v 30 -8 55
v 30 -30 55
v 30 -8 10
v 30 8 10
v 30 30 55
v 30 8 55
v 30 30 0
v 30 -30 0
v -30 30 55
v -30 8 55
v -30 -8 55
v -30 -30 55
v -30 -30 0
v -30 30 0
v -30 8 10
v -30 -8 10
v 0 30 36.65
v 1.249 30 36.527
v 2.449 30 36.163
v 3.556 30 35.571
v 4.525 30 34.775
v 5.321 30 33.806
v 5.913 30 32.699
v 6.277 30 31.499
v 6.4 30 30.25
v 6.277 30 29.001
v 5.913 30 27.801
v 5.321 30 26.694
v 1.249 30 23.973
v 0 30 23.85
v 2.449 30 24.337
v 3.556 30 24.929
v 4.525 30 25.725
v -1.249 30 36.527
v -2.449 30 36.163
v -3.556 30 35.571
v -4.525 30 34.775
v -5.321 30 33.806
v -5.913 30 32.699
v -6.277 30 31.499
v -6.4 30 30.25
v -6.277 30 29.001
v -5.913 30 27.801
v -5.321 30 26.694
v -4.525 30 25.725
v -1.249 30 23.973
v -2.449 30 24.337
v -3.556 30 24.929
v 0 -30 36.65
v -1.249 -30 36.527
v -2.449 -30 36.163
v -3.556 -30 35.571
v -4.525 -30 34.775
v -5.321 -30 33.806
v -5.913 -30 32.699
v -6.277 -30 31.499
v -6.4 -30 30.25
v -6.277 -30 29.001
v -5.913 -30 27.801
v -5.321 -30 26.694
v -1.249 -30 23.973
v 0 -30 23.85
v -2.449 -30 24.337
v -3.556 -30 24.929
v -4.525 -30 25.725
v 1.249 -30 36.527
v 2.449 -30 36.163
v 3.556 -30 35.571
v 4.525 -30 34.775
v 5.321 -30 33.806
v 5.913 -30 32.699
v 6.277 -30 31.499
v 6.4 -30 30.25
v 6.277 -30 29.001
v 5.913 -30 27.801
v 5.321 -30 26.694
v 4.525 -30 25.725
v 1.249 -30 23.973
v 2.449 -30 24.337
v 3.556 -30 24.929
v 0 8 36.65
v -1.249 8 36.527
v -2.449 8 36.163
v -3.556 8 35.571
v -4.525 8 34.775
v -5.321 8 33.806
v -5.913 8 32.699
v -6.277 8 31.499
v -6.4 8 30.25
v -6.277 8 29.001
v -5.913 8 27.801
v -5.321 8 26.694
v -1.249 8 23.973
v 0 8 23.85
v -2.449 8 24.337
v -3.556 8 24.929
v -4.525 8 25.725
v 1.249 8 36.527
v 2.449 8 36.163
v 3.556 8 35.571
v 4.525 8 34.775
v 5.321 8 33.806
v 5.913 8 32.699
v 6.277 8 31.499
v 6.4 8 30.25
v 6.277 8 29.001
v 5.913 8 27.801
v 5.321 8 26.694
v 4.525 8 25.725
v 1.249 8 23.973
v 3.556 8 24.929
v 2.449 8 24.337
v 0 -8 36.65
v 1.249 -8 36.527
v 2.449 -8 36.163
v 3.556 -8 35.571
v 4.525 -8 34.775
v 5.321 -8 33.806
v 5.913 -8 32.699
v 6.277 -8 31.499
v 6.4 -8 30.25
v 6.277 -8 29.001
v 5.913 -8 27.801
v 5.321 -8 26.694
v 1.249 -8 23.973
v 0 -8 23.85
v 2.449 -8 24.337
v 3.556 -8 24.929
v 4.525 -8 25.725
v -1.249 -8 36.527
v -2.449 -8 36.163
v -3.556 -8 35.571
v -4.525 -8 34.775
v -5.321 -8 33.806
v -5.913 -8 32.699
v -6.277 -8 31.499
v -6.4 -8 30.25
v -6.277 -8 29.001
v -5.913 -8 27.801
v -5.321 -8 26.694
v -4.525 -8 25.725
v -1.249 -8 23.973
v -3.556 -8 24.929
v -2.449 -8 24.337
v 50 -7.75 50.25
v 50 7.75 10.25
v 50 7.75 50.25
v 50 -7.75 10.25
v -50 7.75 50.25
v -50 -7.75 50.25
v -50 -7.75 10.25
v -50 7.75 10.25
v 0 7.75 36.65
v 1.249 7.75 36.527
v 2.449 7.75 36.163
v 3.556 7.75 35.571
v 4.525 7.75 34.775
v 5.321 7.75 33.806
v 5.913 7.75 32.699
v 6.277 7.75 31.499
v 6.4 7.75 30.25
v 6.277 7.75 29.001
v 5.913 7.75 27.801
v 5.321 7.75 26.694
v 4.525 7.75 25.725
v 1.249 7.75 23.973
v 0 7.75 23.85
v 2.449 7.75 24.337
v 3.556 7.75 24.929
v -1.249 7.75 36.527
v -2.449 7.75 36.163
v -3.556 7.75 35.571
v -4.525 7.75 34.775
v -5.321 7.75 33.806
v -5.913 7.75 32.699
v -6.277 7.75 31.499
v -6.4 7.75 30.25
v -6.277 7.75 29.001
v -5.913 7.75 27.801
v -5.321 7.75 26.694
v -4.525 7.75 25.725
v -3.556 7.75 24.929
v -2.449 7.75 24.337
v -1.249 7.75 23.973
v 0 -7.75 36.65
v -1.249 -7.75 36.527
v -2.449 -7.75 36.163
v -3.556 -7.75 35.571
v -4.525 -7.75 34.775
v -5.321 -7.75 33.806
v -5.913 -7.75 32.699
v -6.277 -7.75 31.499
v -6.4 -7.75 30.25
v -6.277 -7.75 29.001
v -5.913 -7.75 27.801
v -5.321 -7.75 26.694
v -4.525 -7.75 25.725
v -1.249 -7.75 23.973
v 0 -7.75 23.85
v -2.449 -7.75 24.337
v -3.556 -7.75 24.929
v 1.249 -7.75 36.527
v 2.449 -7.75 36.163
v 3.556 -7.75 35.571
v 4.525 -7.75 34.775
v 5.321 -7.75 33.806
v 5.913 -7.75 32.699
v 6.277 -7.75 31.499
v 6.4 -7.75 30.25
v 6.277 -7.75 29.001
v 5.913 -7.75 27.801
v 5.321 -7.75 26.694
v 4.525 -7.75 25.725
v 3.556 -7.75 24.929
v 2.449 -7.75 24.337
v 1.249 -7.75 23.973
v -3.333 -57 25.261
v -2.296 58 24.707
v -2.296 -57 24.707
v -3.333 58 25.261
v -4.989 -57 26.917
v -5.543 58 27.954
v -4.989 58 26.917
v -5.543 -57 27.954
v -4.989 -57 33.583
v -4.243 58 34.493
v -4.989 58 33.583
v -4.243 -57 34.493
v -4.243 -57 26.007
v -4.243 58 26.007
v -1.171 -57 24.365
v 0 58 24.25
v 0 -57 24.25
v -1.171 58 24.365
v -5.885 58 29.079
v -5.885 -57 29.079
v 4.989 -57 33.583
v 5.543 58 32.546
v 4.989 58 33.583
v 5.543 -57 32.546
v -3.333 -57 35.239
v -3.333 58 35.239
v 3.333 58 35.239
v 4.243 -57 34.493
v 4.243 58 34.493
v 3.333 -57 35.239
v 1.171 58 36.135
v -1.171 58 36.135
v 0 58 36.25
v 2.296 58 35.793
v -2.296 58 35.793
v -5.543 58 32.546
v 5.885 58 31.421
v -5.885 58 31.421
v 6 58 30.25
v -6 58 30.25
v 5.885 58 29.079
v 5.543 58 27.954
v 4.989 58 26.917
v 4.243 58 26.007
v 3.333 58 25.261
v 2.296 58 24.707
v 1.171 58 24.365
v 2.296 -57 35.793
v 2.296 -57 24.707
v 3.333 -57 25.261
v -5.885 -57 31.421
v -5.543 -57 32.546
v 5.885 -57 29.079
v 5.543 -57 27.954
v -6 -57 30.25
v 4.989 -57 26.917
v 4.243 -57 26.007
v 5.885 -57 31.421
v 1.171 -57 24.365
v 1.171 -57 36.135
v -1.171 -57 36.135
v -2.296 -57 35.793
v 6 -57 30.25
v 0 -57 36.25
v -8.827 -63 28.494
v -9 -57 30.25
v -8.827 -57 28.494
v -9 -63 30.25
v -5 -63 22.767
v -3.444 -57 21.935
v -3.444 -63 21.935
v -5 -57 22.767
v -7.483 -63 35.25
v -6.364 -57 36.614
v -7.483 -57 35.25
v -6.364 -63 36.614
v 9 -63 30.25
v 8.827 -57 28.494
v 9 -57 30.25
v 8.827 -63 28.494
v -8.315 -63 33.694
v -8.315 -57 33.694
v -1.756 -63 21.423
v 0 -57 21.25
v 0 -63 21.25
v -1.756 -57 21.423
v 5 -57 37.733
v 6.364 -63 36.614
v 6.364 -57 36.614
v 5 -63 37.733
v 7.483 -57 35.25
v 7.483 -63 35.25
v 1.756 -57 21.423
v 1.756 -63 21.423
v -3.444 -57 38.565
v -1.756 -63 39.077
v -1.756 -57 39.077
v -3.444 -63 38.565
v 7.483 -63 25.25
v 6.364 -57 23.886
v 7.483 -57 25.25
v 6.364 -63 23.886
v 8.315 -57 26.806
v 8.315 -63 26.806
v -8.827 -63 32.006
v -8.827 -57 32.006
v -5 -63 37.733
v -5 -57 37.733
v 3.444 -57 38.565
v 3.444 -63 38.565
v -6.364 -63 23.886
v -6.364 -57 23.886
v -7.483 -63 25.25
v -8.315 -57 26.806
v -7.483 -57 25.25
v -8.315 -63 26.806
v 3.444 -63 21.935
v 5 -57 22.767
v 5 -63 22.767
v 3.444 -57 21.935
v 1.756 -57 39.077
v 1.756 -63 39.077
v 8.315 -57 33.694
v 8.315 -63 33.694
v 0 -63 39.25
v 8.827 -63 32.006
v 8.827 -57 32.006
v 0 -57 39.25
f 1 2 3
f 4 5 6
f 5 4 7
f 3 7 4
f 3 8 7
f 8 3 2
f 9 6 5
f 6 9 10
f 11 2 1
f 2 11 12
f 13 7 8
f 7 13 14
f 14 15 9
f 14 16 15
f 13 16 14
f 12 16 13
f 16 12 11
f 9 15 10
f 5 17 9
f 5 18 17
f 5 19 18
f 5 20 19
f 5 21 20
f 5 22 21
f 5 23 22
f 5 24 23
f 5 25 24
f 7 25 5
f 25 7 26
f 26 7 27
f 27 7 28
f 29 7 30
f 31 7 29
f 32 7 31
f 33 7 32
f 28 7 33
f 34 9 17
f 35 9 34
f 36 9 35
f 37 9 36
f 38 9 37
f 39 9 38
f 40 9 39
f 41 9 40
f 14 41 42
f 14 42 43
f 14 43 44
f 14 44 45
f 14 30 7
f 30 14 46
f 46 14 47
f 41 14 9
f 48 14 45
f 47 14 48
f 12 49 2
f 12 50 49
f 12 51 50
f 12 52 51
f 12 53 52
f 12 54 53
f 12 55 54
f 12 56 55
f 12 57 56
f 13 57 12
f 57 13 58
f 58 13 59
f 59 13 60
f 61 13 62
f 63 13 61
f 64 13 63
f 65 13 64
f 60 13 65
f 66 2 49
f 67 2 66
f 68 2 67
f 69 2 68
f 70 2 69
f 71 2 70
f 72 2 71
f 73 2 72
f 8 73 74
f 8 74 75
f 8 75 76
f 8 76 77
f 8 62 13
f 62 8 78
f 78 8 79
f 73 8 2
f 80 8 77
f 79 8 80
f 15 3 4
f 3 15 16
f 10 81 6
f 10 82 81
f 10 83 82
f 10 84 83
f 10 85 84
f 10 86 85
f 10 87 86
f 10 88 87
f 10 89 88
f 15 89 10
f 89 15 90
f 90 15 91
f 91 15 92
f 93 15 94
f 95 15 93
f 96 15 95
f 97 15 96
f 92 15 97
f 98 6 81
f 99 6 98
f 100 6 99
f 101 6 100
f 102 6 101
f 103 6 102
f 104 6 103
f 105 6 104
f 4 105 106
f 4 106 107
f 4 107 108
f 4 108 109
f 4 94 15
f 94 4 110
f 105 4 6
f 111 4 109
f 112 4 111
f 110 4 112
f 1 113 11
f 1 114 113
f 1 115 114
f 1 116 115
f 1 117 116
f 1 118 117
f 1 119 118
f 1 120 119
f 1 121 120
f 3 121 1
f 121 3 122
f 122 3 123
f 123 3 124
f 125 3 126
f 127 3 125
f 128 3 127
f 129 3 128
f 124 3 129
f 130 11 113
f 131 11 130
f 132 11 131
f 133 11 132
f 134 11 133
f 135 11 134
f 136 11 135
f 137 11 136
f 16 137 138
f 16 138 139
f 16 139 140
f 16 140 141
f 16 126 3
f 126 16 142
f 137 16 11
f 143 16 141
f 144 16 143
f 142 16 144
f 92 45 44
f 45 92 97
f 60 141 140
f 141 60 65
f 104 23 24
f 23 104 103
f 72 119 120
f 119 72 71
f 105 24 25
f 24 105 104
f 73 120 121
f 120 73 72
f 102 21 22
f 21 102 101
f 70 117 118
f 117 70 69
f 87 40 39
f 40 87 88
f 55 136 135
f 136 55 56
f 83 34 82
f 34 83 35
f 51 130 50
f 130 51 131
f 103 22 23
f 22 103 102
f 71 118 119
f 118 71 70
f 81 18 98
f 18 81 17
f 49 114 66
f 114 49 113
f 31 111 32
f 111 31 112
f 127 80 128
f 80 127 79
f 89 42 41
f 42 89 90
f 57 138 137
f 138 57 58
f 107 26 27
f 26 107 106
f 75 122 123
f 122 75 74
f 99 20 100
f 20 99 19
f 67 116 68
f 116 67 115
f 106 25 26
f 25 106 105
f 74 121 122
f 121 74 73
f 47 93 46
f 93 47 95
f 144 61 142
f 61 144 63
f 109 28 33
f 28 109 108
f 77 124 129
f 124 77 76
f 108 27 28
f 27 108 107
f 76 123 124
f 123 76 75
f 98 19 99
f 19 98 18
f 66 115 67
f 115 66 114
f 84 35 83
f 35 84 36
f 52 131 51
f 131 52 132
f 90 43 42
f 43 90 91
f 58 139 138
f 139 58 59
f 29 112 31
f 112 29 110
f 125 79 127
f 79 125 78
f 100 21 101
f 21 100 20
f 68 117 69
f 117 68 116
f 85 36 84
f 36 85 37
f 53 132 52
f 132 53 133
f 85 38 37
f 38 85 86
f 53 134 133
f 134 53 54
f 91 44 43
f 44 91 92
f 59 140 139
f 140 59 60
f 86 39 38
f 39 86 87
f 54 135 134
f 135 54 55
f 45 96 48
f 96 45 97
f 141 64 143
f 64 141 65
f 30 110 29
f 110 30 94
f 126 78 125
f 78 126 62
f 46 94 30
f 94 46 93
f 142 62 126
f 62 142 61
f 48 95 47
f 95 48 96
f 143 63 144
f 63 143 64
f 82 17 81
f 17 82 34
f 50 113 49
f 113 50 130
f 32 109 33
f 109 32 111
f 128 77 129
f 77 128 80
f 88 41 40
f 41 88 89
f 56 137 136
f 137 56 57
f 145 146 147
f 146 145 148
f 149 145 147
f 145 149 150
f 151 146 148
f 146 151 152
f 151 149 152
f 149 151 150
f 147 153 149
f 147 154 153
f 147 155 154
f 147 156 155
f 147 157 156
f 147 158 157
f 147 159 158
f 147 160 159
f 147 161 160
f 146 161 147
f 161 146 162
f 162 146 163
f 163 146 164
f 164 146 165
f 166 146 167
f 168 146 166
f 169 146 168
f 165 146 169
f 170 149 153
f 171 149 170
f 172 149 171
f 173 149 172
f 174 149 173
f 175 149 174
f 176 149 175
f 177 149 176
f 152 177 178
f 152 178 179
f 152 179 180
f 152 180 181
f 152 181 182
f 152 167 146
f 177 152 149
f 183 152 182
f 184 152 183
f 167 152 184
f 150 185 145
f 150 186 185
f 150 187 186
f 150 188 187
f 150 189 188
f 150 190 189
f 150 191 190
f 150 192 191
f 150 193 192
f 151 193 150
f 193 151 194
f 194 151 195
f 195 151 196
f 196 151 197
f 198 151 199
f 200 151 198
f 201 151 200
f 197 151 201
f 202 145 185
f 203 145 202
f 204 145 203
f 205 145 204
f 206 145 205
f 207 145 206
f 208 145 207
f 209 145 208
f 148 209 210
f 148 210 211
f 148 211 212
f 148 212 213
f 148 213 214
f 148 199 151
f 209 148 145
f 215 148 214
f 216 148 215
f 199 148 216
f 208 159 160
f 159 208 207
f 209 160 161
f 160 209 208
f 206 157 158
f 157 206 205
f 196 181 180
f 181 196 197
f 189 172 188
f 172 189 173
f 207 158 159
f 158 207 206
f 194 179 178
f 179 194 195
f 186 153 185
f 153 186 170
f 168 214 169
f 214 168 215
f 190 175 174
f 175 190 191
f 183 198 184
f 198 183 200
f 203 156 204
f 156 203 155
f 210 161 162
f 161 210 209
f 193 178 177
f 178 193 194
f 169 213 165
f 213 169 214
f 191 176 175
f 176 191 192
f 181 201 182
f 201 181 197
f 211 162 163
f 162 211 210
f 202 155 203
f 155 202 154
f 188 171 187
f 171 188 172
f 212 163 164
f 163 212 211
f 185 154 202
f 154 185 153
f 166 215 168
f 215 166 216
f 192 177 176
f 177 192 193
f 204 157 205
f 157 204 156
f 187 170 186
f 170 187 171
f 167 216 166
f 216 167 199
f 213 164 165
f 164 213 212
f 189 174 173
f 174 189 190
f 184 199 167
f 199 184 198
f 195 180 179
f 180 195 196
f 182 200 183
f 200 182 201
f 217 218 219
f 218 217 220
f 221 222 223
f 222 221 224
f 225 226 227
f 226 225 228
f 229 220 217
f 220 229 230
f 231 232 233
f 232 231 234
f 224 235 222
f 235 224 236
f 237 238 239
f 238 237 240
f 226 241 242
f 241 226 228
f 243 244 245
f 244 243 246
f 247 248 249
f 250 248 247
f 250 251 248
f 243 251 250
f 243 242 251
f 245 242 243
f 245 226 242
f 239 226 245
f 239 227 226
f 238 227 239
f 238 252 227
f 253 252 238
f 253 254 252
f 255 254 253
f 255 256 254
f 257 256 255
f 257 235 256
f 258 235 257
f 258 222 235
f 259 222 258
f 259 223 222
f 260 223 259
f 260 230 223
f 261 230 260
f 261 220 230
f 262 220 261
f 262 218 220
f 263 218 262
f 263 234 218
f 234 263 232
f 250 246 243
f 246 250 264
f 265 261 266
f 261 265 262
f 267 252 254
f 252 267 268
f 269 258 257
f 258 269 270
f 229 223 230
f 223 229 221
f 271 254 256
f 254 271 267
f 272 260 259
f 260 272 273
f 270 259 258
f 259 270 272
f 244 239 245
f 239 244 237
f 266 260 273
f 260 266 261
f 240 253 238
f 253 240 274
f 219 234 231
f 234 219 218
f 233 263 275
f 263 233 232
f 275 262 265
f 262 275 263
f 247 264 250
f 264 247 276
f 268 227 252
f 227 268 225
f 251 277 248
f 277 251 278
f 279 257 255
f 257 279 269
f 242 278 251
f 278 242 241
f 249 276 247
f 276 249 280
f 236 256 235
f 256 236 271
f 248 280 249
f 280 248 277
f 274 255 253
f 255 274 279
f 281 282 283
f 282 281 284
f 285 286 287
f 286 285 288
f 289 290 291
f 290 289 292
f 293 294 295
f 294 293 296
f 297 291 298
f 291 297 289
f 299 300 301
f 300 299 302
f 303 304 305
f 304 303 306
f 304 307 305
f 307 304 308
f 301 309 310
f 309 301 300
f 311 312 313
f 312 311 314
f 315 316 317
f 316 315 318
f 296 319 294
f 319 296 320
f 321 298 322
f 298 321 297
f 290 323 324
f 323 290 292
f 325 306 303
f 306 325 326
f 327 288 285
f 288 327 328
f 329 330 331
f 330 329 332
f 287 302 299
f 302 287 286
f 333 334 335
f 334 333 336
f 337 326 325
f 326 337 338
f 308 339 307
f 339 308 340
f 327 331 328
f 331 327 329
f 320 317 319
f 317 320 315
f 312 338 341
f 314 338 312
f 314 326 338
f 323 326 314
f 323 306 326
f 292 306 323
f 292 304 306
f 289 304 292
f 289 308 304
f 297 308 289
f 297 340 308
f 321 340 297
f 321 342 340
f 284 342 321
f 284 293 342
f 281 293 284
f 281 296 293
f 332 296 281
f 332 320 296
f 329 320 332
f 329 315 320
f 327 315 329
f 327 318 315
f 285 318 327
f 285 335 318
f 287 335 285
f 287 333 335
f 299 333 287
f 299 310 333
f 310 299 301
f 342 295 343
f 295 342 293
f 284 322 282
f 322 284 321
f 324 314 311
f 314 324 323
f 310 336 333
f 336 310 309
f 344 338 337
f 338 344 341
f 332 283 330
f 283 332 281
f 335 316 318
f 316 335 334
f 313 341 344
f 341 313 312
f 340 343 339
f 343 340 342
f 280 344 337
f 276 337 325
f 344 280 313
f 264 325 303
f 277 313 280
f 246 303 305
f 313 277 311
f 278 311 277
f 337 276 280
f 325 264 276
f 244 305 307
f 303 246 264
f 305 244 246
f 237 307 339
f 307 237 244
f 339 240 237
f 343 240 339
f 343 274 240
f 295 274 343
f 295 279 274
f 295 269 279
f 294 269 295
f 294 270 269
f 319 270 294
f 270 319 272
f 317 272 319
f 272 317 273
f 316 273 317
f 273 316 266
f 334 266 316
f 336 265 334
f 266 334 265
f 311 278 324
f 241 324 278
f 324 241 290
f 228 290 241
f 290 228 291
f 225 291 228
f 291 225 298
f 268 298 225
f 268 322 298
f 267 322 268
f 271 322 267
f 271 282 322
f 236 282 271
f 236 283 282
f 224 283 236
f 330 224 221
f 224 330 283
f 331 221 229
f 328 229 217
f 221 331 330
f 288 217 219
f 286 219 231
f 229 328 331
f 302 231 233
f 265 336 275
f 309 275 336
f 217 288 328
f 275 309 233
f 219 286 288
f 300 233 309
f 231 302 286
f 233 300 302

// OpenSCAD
$fn = 32;

// ------------------------------------------------------------------------
// Clevis joint: 60 mm clevis, pin d12
// Every part is its own module, assembly() places them once.
// ------------------------------------------------------------------------

// --- part 1 ---
module clevis() {
  difference() {
    translate([-30, -30, 0]) cube([60, 60, 55]);
    translate([-31, -8, 10]) cube([62, 16, 46]);
    translate([0, 0, 30.25]) rotate([90, 0, 0]) cylinder(h = 62, d = 12.8, center = true);
  }
}

// --- part 2 ---
module eye() {
  difference() {
    translate([-50, -7.75, 0]) cube([100, 15.5, 40]);
    translate([0, 0, 20]) rotate([90, 0, 0]) cylinder(h = 17.5, d = 12.8, center = true);
  }
}

// --- part 3 ---
module pin() {
  rotate([0, 90, 0]) cylinder(h = 116, d = 12, center = true);
  translate([-63, 0, 0]) rotate([0, 90, 0]) cylinder(h = 6, d = 18);
}

// --- assembly ---
module assembly() {
  translate([0, 0, 0]) rotate([0, 0, 0]) clevis();
  translate([0, 0, 10.25]) rotate([0, 0, 0]) eye();
  translate([0, 0, 30.25]) rotate([0, 0, 90]) pin();
}

assembly();
